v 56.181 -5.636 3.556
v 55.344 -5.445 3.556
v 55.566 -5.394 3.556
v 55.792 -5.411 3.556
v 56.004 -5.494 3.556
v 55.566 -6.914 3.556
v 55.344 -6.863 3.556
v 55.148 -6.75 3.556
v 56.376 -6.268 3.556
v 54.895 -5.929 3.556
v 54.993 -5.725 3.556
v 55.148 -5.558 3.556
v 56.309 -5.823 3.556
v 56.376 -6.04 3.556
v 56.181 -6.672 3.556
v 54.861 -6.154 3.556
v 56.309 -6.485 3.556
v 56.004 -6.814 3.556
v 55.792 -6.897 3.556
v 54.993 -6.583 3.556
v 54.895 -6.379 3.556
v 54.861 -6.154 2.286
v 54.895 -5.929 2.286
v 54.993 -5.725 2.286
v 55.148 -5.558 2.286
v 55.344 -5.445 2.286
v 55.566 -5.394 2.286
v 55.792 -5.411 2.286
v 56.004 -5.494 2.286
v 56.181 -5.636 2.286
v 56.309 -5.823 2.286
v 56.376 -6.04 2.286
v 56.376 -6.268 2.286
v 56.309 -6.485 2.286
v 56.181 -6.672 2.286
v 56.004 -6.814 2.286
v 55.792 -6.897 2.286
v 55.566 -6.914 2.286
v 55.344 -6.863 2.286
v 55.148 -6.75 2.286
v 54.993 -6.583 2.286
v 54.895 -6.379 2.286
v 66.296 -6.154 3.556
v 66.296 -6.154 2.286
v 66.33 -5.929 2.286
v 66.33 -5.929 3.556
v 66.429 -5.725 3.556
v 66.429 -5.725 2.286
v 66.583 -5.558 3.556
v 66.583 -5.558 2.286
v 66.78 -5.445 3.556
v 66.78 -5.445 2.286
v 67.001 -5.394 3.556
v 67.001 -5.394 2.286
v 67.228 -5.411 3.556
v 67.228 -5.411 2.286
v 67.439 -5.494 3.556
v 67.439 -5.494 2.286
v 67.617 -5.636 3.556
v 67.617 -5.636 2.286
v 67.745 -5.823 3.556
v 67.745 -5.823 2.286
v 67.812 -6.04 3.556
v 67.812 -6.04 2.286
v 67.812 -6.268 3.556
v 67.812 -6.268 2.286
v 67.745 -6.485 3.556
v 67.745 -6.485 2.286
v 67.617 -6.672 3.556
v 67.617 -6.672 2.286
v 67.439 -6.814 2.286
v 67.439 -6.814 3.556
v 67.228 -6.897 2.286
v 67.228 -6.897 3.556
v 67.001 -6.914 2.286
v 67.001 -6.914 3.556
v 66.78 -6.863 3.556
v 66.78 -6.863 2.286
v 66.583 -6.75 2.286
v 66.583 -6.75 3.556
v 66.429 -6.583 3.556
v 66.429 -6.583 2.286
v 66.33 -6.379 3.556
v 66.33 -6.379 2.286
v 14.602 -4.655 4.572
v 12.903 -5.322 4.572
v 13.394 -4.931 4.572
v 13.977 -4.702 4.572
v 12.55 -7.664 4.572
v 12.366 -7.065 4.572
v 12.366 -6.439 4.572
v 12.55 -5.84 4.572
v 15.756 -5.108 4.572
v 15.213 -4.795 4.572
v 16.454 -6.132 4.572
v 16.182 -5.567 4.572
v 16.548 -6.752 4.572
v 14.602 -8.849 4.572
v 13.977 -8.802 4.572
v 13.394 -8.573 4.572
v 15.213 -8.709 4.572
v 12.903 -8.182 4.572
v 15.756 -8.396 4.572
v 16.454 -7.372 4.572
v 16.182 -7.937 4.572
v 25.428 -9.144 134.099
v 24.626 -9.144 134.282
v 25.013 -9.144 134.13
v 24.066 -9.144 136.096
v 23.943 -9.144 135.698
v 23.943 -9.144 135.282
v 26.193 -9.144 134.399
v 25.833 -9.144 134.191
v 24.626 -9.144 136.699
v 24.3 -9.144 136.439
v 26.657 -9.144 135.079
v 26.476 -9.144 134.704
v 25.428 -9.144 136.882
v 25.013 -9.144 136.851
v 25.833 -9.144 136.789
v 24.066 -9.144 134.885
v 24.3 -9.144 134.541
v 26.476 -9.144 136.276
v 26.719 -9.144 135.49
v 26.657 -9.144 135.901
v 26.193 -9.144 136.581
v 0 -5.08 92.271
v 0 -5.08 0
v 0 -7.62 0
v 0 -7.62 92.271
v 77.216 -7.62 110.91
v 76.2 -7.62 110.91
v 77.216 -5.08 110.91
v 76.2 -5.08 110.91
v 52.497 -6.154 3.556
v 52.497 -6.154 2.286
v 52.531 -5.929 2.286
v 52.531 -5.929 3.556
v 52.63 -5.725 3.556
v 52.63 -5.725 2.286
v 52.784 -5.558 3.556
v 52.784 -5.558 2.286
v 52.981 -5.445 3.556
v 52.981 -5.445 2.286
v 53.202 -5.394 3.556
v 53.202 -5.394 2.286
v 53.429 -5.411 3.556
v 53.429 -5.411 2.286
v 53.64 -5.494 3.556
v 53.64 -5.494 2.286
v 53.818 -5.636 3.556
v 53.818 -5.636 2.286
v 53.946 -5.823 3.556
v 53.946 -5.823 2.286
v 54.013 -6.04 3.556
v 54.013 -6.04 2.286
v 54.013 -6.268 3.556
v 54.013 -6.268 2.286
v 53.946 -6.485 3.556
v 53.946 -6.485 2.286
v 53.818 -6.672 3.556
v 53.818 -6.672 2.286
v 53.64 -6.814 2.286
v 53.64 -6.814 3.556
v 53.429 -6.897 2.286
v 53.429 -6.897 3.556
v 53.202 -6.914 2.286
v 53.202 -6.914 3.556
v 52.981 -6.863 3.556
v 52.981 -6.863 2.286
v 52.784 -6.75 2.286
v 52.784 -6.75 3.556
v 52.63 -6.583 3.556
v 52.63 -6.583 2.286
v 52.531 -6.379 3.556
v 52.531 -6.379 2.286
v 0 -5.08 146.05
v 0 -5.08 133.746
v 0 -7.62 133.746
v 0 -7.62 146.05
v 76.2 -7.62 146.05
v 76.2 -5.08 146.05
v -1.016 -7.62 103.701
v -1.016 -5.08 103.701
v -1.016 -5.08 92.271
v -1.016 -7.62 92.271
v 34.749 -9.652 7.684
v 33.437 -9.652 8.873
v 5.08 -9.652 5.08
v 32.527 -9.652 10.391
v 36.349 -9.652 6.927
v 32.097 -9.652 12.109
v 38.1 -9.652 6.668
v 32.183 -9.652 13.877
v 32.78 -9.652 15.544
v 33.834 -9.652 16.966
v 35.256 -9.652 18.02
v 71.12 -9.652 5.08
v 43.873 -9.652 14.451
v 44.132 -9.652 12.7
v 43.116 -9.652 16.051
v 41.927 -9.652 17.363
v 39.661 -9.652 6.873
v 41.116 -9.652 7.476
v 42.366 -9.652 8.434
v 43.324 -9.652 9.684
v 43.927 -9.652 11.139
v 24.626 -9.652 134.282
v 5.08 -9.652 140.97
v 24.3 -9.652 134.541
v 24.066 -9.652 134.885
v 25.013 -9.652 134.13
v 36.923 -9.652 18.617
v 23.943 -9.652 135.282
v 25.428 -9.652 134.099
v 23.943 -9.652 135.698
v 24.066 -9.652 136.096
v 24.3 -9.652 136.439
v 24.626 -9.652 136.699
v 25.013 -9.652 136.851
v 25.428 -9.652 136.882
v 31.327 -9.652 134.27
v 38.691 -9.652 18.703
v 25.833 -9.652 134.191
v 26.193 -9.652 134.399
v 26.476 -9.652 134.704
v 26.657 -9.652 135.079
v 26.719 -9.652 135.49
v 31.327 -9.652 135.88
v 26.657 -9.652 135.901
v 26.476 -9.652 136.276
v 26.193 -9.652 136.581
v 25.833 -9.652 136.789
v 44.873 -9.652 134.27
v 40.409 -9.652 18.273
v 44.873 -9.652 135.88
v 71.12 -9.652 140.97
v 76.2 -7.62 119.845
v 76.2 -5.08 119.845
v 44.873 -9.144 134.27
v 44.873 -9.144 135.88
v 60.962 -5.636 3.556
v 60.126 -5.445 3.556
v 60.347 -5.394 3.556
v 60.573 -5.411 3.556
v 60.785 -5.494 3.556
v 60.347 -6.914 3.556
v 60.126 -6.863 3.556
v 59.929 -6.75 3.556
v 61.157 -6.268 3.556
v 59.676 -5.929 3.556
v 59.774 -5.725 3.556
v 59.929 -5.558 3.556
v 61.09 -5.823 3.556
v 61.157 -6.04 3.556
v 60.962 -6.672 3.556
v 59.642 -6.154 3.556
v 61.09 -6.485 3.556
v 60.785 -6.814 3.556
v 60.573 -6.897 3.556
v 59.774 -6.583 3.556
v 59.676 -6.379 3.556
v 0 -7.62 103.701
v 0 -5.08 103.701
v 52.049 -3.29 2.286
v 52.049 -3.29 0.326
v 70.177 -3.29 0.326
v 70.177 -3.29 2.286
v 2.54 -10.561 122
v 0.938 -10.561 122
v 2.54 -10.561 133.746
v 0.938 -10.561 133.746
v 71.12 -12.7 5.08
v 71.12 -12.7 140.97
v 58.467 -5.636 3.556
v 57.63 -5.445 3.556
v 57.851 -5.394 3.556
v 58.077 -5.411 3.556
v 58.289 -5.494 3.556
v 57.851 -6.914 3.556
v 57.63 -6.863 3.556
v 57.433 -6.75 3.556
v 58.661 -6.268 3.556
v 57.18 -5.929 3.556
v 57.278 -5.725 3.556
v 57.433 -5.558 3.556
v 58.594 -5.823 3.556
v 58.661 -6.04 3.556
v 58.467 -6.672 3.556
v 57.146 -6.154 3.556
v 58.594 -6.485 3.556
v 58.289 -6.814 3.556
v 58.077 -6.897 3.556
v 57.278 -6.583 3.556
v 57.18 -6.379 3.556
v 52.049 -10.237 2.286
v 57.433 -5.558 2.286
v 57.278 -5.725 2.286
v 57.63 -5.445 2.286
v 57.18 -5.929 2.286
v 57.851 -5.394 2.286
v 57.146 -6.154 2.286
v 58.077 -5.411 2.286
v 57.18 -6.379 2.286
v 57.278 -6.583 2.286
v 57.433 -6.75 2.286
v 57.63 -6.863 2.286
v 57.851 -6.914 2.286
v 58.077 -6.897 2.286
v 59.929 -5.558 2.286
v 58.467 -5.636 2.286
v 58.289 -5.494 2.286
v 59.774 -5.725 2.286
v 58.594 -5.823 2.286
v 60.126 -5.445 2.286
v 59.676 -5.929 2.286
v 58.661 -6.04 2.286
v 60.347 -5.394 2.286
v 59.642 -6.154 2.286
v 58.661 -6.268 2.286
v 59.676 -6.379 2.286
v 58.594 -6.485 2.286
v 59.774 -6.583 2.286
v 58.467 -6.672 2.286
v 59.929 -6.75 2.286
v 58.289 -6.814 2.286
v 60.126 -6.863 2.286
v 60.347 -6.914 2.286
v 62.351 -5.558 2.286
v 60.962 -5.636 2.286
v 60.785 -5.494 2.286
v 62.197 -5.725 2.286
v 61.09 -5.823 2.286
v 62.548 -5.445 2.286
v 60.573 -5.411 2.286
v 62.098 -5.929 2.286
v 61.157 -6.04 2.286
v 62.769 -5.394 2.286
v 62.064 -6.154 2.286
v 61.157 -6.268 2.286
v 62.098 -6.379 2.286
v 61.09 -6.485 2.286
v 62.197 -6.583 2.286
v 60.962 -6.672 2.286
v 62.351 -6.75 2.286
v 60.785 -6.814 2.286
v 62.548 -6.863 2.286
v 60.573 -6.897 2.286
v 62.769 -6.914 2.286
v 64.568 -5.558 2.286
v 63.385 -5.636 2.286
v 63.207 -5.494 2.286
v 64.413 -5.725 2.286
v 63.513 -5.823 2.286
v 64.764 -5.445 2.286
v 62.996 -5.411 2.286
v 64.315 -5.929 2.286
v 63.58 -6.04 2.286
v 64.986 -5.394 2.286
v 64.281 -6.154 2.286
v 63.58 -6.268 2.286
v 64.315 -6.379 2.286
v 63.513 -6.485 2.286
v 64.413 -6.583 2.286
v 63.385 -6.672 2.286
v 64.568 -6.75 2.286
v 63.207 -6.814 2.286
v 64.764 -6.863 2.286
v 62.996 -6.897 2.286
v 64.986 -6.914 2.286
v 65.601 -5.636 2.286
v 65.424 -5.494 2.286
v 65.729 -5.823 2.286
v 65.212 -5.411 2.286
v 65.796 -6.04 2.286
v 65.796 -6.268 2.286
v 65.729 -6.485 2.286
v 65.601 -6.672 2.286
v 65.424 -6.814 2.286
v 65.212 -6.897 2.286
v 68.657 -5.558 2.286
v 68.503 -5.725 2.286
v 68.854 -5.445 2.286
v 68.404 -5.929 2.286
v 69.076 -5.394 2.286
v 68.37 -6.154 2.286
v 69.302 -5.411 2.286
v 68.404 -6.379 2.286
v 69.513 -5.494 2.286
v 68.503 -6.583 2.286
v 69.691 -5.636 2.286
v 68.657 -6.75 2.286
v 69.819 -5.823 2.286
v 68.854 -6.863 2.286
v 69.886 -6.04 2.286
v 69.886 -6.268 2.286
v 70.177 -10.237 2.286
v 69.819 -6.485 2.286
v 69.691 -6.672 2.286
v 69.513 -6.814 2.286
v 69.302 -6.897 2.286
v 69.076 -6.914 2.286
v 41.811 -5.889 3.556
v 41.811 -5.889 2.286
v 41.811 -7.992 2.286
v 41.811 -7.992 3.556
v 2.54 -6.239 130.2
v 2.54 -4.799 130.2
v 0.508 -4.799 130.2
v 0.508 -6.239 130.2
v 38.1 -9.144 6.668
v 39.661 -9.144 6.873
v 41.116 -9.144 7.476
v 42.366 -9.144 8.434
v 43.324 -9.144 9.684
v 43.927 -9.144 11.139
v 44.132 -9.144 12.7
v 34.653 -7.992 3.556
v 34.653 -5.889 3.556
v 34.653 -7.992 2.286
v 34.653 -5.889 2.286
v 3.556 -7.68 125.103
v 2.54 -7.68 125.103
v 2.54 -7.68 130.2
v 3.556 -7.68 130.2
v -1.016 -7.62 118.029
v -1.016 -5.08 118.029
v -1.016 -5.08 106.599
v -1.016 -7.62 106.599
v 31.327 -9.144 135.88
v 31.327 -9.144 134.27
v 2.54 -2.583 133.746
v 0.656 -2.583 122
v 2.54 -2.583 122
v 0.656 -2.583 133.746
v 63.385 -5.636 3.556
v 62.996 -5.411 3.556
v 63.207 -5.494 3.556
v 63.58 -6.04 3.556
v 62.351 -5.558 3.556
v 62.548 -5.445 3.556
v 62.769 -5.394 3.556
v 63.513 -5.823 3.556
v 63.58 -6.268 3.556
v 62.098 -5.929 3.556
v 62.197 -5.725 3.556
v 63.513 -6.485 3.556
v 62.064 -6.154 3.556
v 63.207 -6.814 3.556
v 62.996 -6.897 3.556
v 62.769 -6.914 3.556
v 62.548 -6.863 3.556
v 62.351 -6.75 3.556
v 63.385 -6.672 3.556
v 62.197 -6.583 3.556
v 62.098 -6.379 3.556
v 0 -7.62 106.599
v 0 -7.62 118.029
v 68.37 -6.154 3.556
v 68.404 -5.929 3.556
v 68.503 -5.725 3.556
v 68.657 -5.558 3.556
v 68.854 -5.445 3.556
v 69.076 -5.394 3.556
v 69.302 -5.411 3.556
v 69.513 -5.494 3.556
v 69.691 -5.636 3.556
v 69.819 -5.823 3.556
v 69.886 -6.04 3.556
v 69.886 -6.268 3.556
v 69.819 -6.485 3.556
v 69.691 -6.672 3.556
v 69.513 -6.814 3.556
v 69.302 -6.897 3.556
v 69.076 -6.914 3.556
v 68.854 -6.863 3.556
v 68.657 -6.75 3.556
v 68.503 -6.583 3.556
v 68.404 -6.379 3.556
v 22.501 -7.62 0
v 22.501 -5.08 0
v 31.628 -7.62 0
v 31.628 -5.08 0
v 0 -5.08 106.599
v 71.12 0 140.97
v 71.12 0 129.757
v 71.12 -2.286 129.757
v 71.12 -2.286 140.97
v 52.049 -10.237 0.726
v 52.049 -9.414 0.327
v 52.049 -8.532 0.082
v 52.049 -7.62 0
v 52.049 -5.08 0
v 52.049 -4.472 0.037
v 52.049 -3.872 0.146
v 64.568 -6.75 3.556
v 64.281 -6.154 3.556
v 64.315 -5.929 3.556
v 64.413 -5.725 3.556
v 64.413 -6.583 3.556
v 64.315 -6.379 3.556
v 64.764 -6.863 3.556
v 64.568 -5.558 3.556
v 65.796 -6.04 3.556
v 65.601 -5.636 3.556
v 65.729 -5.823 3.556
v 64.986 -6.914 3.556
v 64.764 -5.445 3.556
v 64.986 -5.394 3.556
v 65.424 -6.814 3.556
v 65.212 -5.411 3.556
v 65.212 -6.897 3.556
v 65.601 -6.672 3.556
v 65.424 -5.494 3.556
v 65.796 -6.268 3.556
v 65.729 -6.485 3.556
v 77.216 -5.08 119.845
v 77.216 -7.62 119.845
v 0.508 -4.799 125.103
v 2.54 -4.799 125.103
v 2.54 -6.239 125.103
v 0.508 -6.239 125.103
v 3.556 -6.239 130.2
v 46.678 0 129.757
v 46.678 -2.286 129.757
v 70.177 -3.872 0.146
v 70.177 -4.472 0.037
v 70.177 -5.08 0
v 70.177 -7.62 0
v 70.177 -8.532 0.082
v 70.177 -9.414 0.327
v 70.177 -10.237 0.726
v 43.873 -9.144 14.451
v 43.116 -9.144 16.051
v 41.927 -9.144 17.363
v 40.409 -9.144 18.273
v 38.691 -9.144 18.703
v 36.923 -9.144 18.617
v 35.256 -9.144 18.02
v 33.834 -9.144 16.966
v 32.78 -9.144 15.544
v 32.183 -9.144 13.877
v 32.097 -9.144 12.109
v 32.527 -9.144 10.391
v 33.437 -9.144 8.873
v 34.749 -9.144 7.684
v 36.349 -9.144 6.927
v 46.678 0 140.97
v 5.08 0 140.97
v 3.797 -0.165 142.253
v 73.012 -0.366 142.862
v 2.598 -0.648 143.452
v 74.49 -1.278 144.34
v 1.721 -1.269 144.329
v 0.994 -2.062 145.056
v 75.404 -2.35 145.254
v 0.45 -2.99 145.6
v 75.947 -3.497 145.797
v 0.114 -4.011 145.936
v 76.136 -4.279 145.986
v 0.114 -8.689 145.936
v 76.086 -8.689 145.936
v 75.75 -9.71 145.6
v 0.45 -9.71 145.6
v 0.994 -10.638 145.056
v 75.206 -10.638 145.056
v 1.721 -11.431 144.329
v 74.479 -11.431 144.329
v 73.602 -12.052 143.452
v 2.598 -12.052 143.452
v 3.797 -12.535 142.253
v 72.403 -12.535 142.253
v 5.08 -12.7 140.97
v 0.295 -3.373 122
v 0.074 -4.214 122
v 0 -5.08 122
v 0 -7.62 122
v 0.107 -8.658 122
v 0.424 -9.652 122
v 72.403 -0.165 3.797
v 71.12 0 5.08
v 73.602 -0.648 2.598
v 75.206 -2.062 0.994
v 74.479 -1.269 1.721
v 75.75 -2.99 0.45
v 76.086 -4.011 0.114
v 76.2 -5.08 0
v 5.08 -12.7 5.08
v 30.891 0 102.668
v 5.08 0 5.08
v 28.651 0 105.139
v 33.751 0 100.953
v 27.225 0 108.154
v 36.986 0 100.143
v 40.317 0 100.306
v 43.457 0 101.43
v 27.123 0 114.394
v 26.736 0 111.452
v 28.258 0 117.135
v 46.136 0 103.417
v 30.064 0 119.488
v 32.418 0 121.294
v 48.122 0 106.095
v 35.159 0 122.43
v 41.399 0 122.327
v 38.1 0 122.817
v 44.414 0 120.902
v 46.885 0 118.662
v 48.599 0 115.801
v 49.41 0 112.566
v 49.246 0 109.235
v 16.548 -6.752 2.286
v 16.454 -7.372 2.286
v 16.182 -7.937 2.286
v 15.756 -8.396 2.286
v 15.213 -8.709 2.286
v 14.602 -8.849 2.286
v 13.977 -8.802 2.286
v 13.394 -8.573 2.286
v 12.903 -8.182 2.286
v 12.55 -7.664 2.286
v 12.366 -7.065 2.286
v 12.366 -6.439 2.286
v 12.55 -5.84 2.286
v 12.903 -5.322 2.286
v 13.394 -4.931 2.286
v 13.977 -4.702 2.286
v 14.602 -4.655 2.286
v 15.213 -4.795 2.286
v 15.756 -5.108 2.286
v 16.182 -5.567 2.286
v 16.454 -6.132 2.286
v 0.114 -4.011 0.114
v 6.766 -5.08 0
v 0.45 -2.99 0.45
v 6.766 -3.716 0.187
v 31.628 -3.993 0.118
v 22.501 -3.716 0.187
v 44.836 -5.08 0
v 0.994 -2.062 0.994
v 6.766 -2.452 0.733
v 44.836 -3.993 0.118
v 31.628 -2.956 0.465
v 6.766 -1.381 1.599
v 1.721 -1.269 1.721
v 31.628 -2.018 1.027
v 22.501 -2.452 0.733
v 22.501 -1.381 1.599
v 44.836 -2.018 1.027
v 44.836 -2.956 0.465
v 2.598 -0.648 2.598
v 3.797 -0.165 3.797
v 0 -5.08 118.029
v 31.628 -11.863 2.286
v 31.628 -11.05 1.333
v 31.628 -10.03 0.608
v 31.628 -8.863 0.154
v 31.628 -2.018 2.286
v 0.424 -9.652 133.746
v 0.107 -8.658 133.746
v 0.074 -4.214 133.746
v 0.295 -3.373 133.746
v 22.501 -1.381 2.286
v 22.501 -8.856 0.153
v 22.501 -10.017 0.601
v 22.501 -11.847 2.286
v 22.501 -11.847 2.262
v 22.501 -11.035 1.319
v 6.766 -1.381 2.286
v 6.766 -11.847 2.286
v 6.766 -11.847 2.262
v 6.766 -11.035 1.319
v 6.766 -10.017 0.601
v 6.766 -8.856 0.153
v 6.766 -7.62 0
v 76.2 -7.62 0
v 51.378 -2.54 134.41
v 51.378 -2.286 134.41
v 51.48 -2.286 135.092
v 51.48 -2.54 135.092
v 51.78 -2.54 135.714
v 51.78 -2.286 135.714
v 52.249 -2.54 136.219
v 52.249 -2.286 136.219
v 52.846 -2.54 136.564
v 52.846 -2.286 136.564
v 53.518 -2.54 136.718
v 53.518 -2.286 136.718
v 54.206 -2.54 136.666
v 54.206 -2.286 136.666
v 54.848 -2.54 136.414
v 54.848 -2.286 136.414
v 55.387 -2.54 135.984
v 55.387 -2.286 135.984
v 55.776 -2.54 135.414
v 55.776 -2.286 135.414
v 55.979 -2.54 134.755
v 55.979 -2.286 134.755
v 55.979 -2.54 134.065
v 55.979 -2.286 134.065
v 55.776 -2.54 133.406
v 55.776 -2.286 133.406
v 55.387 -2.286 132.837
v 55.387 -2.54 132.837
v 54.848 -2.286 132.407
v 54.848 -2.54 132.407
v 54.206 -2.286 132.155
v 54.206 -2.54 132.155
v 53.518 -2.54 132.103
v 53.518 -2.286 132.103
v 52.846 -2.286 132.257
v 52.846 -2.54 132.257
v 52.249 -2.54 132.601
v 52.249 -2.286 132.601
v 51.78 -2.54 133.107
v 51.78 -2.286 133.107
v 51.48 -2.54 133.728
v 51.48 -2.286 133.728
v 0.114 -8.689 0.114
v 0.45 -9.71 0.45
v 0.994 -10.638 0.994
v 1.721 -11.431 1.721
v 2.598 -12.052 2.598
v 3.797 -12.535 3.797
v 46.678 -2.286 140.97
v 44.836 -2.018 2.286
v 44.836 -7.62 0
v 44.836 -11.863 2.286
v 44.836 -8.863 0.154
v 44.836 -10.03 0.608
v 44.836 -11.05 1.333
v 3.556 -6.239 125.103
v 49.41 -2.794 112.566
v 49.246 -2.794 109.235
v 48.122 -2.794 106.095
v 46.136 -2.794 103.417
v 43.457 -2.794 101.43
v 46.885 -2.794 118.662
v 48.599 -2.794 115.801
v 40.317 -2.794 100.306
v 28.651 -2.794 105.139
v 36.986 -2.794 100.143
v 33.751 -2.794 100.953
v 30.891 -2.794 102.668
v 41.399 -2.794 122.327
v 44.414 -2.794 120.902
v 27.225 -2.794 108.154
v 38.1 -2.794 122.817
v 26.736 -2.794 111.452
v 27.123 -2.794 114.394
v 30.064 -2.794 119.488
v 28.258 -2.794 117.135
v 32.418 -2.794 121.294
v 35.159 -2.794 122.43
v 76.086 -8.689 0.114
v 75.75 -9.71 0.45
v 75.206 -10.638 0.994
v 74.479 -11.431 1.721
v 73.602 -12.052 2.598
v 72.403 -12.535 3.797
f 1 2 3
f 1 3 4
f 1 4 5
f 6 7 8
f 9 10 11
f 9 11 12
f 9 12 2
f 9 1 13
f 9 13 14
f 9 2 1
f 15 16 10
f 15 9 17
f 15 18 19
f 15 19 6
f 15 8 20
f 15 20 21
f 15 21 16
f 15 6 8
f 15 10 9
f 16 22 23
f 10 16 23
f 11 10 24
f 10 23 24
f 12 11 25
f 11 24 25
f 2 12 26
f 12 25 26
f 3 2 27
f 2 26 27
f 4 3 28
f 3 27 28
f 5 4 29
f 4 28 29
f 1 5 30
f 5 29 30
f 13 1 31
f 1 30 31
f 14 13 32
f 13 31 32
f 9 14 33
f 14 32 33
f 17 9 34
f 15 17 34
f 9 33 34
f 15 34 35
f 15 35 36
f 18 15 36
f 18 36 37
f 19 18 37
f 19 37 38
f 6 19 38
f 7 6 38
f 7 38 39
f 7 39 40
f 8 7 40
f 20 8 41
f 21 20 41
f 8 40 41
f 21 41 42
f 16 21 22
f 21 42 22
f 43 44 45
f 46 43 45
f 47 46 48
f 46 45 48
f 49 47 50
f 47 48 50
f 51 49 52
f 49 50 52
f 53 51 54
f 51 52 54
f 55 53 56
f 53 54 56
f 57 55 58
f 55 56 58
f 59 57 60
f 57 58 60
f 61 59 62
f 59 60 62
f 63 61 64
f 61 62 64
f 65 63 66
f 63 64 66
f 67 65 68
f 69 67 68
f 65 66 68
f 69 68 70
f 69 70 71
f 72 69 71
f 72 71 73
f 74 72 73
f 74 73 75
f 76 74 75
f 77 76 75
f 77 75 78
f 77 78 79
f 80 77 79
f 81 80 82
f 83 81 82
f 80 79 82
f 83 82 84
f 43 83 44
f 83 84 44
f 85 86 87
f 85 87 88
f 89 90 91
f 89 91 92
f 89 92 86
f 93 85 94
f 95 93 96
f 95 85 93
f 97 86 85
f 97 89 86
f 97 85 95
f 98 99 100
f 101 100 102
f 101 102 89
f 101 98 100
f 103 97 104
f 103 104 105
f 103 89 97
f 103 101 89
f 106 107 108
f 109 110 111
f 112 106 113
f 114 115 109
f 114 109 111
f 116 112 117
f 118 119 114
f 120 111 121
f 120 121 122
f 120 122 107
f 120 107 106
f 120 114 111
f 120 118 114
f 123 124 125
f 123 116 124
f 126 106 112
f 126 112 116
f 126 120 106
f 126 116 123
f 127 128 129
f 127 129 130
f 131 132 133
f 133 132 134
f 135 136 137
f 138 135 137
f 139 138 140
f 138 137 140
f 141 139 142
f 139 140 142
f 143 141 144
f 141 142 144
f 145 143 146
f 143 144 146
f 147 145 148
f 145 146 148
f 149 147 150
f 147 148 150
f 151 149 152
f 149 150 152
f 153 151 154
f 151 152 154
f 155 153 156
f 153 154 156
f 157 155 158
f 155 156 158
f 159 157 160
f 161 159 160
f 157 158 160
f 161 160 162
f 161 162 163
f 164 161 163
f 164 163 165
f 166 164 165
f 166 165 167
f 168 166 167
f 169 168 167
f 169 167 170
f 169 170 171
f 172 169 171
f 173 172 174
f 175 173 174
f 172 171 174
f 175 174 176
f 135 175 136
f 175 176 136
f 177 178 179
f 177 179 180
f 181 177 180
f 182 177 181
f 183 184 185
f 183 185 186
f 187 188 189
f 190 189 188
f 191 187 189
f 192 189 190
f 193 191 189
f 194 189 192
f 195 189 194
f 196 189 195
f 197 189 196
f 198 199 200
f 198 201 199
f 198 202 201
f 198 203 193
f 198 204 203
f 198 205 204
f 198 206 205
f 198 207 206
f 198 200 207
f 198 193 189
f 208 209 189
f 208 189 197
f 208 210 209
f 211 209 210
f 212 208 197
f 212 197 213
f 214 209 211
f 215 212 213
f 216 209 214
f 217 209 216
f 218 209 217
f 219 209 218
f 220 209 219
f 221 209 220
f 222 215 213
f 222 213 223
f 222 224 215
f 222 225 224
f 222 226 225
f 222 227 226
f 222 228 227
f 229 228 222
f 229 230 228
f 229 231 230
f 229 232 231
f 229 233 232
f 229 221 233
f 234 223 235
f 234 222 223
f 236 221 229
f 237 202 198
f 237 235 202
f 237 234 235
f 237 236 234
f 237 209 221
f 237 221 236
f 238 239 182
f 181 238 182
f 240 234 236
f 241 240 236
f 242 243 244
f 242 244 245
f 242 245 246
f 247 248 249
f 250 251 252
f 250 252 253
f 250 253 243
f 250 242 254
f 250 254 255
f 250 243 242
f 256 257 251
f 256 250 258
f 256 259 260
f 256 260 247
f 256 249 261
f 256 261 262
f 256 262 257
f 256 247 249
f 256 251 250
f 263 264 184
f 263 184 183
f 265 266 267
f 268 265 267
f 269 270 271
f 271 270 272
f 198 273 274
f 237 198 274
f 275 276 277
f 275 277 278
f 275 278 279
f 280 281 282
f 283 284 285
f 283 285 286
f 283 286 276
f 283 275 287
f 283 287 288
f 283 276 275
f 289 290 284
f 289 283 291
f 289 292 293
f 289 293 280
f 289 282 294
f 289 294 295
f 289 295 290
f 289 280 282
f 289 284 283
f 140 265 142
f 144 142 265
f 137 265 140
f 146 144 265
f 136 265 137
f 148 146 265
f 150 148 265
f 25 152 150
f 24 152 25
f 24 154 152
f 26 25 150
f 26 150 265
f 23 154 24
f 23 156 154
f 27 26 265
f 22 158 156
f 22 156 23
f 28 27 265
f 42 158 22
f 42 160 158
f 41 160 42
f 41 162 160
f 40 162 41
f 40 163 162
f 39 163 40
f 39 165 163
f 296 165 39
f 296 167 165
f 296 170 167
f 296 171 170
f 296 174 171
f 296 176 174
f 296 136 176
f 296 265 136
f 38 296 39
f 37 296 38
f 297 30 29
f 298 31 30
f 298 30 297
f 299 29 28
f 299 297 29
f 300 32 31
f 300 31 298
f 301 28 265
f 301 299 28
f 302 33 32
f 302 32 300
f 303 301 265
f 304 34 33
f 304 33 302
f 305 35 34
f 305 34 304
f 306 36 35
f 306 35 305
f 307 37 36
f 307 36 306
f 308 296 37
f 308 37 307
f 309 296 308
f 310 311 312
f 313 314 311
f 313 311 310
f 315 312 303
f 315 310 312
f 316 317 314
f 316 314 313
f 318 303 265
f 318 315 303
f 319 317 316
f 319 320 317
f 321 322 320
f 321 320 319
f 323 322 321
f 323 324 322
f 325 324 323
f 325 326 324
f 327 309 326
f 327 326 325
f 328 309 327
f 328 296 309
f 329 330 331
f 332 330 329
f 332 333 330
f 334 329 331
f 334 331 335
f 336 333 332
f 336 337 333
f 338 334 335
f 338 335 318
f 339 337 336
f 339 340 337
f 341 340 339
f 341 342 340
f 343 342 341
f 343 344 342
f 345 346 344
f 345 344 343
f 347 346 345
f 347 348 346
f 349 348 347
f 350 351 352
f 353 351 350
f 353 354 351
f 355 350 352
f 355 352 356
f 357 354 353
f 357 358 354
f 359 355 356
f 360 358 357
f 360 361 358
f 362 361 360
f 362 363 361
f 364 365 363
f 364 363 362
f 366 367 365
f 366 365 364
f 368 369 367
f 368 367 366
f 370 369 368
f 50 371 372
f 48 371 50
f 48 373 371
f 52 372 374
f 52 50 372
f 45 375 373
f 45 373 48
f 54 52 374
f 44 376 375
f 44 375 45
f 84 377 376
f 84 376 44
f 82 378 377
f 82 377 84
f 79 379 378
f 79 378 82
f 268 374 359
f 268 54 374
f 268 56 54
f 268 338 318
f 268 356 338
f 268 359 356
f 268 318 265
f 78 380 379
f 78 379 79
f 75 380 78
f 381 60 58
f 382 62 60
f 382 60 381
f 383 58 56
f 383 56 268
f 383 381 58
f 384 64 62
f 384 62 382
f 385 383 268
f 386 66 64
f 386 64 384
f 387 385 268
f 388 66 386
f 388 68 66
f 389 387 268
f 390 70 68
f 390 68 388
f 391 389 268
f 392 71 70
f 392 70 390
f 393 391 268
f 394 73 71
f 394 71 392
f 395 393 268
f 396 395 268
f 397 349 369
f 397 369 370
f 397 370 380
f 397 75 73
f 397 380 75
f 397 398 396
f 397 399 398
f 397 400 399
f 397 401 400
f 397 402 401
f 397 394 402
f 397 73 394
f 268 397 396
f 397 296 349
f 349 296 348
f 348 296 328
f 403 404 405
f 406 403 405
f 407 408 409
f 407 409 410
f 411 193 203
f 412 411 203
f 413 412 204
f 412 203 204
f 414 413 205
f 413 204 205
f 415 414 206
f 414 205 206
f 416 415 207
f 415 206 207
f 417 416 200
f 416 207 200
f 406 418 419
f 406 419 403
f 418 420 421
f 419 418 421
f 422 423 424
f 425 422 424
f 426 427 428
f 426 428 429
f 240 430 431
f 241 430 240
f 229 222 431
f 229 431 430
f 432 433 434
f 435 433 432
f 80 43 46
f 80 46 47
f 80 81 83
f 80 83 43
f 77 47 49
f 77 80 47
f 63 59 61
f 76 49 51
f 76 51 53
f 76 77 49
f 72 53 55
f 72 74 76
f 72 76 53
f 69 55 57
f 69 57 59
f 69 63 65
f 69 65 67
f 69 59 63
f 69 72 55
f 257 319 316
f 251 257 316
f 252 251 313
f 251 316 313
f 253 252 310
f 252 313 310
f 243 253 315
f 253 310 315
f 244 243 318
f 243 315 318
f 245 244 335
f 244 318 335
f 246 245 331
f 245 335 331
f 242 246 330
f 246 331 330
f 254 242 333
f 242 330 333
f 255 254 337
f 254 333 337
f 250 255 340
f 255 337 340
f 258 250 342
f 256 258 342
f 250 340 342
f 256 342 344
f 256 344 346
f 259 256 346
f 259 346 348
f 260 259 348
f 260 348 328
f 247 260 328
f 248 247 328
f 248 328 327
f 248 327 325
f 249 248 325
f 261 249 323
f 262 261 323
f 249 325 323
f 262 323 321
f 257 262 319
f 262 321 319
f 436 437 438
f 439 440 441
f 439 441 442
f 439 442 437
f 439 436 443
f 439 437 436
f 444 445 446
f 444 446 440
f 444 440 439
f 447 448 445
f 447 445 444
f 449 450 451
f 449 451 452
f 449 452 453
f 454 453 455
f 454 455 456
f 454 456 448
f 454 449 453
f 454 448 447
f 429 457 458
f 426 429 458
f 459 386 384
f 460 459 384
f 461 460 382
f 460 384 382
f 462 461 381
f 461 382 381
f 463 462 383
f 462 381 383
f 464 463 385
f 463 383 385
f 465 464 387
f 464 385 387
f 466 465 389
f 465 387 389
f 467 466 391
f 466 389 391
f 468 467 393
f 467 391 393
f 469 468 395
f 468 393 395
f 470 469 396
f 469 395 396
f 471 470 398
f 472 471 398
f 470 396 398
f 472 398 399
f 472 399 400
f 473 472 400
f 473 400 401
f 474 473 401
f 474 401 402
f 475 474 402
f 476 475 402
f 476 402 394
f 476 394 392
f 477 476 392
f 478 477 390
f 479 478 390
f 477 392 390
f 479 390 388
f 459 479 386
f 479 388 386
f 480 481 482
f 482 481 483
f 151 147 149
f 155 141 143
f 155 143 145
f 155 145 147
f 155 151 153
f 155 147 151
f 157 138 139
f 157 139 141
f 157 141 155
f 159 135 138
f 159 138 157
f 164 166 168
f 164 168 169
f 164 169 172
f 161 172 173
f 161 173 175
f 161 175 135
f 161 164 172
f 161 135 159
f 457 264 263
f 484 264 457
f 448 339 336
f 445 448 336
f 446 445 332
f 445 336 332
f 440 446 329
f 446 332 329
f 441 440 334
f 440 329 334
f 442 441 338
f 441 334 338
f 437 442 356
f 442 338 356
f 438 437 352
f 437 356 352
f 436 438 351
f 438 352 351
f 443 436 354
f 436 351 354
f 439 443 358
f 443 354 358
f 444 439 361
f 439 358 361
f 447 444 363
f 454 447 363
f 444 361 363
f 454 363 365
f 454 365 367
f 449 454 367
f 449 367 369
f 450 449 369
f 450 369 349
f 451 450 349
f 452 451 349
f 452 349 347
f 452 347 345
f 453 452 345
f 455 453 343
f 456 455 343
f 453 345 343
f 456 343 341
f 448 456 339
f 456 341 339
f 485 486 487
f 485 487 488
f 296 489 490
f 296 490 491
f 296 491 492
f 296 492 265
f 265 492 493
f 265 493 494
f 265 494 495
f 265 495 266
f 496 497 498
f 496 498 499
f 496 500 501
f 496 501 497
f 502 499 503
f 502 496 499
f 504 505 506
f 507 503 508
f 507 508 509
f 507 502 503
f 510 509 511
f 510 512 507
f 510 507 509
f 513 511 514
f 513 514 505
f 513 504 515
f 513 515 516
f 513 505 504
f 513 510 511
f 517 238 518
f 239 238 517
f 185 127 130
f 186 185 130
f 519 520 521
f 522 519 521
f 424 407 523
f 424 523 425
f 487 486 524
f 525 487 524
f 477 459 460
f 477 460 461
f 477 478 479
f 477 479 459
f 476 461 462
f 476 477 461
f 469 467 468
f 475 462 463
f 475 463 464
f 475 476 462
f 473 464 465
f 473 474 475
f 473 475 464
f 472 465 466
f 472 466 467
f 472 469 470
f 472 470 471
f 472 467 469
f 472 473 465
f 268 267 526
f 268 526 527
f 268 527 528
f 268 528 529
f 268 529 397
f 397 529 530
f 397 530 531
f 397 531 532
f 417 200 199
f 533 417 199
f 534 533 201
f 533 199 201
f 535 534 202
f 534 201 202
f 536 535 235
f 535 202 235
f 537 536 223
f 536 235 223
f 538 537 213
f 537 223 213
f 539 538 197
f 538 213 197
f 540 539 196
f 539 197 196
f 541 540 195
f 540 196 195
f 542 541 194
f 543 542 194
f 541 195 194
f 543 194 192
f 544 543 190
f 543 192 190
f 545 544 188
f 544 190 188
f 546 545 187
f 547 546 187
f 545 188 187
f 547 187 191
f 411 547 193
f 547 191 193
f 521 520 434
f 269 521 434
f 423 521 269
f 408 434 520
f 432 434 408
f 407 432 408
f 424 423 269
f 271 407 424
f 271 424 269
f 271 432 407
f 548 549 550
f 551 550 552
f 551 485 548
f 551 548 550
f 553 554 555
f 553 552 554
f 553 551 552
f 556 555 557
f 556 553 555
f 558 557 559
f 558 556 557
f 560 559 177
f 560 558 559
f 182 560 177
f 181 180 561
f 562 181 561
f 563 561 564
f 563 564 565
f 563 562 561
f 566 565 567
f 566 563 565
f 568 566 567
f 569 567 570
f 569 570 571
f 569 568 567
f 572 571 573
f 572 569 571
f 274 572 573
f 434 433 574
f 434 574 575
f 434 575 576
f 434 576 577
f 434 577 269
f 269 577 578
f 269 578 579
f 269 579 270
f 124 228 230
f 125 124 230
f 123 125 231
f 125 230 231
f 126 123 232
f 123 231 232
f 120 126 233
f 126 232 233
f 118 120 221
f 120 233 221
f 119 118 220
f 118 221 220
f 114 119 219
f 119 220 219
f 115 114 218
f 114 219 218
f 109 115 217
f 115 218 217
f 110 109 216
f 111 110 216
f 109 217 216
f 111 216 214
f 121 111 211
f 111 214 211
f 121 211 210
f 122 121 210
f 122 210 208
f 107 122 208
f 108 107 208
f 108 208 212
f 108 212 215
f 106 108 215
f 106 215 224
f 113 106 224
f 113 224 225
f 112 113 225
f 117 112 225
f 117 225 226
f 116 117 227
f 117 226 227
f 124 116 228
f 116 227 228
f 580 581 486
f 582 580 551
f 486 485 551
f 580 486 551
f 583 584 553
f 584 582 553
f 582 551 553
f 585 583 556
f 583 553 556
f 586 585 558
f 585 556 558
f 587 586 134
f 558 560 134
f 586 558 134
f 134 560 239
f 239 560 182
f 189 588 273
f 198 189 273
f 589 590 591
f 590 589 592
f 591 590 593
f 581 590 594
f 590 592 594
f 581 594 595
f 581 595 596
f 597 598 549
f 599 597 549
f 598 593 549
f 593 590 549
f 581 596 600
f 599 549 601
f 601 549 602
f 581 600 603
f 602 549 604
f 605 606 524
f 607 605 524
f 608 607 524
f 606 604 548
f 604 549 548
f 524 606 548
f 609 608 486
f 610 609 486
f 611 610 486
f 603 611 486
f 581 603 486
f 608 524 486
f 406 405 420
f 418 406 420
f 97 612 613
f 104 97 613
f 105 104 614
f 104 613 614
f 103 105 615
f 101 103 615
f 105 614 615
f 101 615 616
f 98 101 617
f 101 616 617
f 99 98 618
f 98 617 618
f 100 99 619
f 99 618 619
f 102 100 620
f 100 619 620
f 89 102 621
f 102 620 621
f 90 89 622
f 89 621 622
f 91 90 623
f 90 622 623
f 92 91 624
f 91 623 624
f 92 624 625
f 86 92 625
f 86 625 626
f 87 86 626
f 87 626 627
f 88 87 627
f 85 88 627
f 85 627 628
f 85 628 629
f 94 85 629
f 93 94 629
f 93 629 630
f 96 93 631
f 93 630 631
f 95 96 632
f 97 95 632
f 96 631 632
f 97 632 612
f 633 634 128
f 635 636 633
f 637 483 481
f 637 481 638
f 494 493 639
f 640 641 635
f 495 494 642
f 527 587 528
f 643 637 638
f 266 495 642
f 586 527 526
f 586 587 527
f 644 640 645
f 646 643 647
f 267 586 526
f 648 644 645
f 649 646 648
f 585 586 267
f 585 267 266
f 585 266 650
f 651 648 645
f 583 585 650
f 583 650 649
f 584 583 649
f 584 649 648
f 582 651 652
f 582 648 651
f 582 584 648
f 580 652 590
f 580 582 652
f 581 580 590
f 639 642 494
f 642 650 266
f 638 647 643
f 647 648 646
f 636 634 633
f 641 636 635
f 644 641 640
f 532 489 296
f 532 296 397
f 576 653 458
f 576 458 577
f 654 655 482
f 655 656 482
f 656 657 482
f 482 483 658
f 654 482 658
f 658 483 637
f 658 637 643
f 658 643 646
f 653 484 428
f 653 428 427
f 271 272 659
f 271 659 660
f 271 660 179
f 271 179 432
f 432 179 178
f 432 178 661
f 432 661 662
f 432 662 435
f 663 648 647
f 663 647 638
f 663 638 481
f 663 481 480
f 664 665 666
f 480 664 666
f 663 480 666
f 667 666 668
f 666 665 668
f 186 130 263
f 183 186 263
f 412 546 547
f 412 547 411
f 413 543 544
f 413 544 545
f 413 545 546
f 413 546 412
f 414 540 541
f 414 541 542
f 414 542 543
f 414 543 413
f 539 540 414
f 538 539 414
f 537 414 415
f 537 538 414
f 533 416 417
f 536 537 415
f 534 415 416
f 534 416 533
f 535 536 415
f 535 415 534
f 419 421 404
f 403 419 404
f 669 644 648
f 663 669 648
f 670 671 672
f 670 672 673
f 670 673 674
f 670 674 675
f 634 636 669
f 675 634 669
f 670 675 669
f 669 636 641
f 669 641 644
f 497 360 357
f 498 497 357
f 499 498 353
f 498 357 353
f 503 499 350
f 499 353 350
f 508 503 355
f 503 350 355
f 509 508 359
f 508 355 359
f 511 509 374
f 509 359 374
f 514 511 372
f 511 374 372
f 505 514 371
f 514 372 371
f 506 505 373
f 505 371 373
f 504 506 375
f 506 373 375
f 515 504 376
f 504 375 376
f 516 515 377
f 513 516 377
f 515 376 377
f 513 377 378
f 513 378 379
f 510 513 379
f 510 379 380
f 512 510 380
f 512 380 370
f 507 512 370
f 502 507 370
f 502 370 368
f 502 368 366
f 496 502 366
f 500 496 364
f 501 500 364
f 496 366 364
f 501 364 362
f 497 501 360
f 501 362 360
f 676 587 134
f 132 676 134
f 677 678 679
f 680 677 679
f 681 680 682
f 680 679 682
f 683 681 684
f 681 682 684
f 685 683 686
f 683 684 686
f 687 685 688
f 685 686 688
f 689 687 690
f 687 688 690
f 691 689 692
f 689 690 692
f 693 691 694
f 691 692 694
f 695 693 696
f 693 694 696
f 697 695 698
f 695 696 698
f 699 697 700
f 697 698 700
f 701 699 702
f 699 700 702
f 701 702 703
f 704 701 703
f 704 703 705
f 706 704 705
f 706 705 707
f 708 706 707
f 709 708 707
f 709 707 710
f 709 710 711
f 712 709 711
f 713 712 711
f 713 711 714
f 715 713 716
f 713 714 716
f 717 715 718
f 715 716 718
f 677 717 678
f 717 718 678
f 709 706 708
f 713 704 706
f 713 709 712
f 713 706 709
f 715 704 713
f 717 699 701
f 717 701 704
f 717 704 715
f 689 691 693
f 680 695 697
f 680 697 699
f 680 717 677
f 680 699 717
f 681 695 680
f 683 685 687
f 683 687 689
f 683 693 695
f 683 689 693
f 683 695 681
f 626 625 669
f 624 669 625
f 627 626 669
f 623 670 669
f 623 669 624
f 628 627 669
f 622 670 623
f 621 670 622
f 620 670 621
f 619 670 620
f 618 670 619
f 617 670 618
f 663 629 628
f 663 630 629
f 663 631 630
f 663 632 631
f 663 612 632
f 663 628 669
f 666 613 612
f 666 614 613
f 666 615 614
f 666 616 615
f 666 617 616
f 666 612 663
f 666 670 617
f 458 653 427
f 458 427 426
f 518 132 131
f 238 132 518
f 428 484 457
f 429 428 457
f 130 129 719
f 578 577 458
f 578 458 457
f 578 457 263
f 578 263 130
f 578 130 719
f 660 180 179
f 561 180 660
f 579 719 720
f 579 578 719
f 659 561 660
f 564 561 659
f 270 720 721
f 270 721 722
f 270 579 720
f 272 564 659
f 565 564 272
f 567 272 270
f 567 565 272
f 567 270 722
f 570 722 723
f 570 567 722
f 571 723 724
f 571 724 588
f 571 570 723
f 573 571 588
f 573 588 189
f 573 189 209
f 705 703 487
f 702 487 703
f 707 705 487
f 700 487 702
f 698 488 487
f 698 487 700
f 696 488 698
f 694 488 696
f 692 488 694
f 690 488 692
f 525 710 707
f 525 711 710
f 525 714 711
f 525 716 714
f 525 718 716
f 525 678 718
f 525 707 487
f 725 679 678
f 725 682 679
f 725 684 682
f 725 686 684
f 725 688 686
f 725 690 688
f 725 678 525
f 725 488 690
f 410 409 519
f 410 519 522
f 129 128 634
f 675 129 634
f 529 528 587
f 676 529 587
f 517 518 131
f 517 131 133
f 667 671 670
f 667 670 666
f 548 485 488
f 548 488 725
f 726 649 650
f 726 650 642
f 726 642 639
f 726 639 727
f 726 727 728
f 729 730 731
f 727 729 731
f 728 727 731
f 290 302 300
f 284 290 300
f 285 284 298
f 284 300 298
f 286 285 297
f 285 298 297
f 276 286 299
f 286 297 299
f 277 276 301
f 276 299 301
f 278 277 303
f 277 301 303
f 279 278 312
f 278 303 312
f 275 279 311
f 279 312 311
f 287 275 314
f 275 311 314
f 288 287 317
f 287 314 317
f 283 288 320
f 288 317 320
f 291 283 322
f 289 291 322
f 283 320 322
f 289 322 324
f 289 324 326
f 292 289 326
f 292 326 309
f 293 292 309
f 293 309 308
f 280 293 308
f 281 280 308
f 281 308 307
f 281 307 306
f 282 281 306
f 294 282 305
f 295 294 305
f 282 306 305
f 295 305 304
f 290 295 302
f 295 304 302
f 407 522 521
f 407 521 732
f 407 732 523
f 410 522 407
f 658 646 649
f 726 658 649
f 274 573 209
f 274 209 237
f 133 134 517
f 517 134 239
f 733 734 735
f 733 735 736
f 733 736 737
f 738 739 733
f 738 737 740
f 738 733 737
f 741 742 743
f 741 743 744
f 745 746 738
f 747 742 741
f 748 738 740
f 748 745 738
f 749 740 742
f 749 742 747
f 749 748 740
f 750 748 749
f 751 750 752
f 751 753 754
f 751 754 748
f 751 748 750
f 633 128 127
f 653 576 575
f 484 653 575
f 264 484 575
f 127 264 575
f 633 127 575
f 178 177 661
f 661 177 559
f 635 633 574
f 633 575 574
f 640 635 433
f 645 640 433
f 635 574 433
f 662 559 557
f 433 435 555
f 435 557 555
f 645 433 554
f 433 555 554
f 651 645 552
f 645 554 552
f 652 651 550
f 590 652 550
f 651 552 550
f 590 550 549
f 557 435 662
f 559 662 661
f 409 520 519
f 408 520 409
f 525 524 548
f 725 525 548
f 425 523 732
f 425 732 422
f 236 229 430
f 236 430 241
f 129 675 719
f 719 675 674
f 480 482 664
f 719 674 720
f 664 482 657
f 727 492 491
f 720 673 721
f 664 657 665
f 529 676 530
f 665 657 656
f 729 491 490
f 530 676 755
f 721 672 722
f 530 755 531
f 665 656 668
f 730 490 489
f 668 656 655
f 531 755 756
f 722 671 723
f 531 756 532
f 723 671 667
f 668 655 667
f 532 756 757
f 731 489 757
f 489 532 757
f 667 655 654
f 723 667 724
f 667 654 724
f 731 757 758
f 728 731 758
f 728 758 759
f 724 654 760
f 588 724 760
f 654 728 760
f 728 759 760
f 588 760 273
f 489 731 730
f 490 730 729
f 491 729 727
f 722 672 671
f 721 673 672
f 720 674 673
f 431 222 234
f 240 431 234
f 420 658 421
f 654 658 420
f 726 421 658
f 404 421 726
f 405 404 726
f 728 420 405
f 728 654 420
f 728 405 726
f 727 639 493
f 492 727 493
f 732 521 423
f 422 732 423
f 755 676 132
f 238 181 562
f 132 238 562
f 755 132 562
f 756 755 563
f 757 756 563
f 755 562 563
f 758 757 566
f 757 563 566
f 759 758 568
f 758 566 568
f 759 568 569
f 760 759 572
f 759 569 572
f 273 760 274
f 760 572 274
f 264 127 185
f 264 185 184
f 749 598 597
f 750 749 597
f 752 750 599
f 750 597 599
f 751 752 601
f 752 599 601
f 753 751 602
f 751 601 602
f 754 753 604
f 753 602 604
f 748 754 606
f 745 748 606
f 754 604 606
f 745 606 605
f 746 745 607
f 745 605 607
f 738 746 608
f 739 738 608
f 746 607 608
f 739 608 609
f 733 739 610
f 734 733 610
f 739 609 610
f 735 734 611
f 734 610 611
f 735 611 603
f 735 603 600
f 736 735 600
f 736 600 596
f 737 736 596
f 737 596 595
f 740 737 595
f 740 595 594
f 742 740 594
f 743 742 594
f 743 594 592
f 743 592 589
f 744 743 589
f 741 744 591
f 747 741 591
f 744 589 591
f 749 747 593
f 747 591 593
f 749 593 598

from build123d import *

# Parameters (mm, degrees)
F0_W      = 76.2
F0_H      = 146.05
F1_DEPTH  = 12.7
F2_R      = 5.08
F3_R      = 5.08
F4_DEPTH  = 2.54
F5_W      = 2.4973305091
F5_H      = 11.7452070117
F5_W_2    = 2.54
F5_W_3    = 2.9405460703
F6_DEPTH  = 2.54
F7_W      = 2.8808997013
F7_H      = 5.0969719887
F8_DEPTH  = 2.032
F9_W      = 1.4404498506
F9_H      = 5.0969719887
F10_DEPTH = 3.048
F11_W     = 2.54
F11_H     = 11.43
F12_DEPTH = 1.016
F13_W     = 2.54
F13_H     = 11.43
F14_DEPTH = 1.016
F16_DEPTH = 0.508
F17_W     = 15.7348513603
F17_H     = 10.4662538506
F17_H_2   = 4.2268524888
F18_DEPTH = 2.286
F19_W     = 18.1282758713
F19_H     = 1.7902922965
F19_H_2   = 2.54
F19_H_3   = 2.6172961119
F20_DEPTH = 2.286
F21_R     = 2.1027824112
F22_DEPTH = 2.286
F24_DEPTH = 1.27
F25_W     = 13.5468328476
F25_H     = 1.6100406647
F4_FACE_W = 66.04
F4_FACE_H = 135.89
F4_FACE_R = 6.0325
F26_DEPTH = 0.508
F27_R     = 1.3953400064
F28_DEPTH = 0.508
F30_DEPTH = 0.508
F31_W     = 6.604
F31_H     = 3.0624943002
F31_H_2   = 5.8275056998
F31_H_3   = 2.54
F32_DEPTH = 2.286
F34_DEPTH = 1.27
F35_W     = 24.4420864832
F35_H     = 11.2134301376
F36_DEPTH = 2.286
F39_R     = 2.3136513578
F40_DEPTH = 0.254
F42_DEPTH = 1.016
F43_DEPTH = 1.778
F44_W     = 2.54
F44_H     = 8.934661746
F45_DEPTH = 1.016


# Not quite as in the source:
# - the program builds the solid bodies; features that only make, move or delete a surface that nothing else refers to are left out


with BuildPart() as f1:
    # F0 (on Front) → F1 (new body)
    with BuildSketch(Plane.XZ):
        with Locations((38.1, 73.025)):
            Rectangle(F0_W, F0_H)
    extrude(amount=F1_DEPTH)

    # F2
    f2_edges = [f1.edges().sort_by_distance(p)[0] for p in [
        (0, -12.7, 73.025),
        (38.1, -12.7, 0),
        (76.2, -12.7, 73.025),
        (38.1, -12.7, 146.05),
    ]]
    fillet(f2_edges, radius=F2_R)

    # F3
    f3_edges = [f1.edges().sort_by_distance(p)[0] for p in [
        (0, 0, 73.025),
        (38.1, 0, 0),
        (76.2, 0, 73.025),
        (38.1, 0, 146.05),
    ]]
    fillet(f3_edges, radius=F3_R)

    # F4 (cut): a face of the model
    f4_faces = [f1.faces().sort_by_distance(p)[0] for p in [
        (38.1, -12.7, 73.025),
    ]]
    extrude(f4_faces, amount=-F4_DEPTH, mode=Mode.SUBTRACT)

    # F5 (on face) → F6 (cut)
    with BuildSketch(Plane(origin=(0, 0, 0), x_dir=(0, -1, 0), z_dir=(-1, 0, 0))):
        with Locations((3.8313347455, 127.8729029)):
            Rectangle(F5_W, F5_H)
        with Locations((6.35, 127.8729029)):
            Rectangle(F5_W_2, F5_H)
        with Locations((9.0902730352, 127.8729029)):
            Rectangle(F5_W_3, F5_H)
    extrude(amount=-F6_DEPTH, mode=Mode.SUBTRACT)

    # F7 (on face) → F8 (join)
    with BuildSketch(Plane(origin=(2.54, 0, 0), x_dir=(0, -1, 0), z_dir=(-1, 0, 0))):
        with Locations((6.2391965184, 127.6512891054)):
            Rectangle(F7_W, F7_H)
    extrude(amount=F8_DEPTH)

    # F9 (on face) → F10 (cut)
    with BuildSketch(Plane(origin=(0.508, 0, 0), x_dir=(0, -1, 0), z_dir=(-1, 0, 0))):
        with Locations((6.9594214438, 127.6512891054)):
            Rectangle(F9_W, F9_H)
    extrude(amount=-F10_DEPTH, mode=Mode.SUBTRACT)

    # F11 (on face) → F12 (join)
    with BuildSketch(Plane(origin=(0, 0, 0), x_dir=(0, -1, 0), z_dir=(-1, 0, 0))):
        with Locations((6.35, 112.3141669893)):
            Rectangle(F11_W, F11_H)
    extrude(amount=F12_DEPTH)

    # F13 (on face) → F14 (join)
    with BuildSketch(Plane(origin=(0, 0, 0), x_dir=(0, -1, 0), z_dir=(-1, 0, 0))):
        with Locations((6.35, 97.9860373998)):
            Rectangle(F13_W, F13_H)
    extrude(amount=F14_DEPTH)

    # F15 (on face) → F16 (cut)
    with BuildSketch(Plane.XZ.offset(10.16)):
        with BuildLine():
            ThreePointArc((44.1325, 12.7), (33.8343783425, 16.9656216575), (38.1, 6.6675))
            ThreePointArc((38.1, 6.6675), (42.3656216575, 8.4343783425), (44.1325, 12.7))
        make_face()
    extrude(amount=-F16_DEPTH, mode=Mode.SUBTRACT)

    # F17 (on face) → F18 (cut)
    with BuildSketch(Plane(origin=(0, 0, 0), x_dir=(1, 0, 0), z_dir=(0, 0, -1))):
        with Locations((14.6331973374, 6.6137255635)):
            Rectangle(F17_W, F17_H)
        with Locations((14.6331973374, 9.7334262444)):
            Rectangle(F17_W, F17_H_2)
    extrude(amount=-F18_DEPTH, mode=Mode.SUBTRACT)

    # F19 (on face) → F20 (cut)
    with BuildSketch(Plane(origin=(0, 0, 0), x_dir=(1, 0, 0), z_dir=(0, 0, -1))):
        with Locations((61.1127465963, 4.1848538518)):
            Rectangle(F19_W, F19_H)
        with Locations((61.1127465963, 6.35)):
            Rectangle(F19_W, F19_H_2)
        with Locations((61.1127465963, 8.9286480559)):
            Rectangle(F19_W, F19_H_3)
    extrude(amount=-F20_DEPTH, mode=Mode.SUBTRACT)

    # F21 (on face) → F22 (cut)
    with BuildSketch(Plane(origin=(0, 0, 2.286), x_dir=(1, 0, 0), z_dir=(0, 0, -1))):
        with Locations((14.4449183717, 6.7520015873)):
            Circle(F21_R)
    extrude(amount=-F22_DEPTH, mode=Mode.SUBTRACT)

    # F23 (on face) → F24 (cut)
    with BuildSketch(Plane(origin=(0, 0, 2.286), x_dir=(1, 0, 0), z_dir=(0, 0, -1))):
        with BuildLine():
            ThreePointArc((54.0211938972, 6.1539337039), (53.2591938972, 6.9159337039), (52.4971938972, 6.1539337039))
            Line((52.4971938972, 6.1539337039), (54.0211938972, 6.1539337039))
        make_face()
        with BuildLine():
            ThreePointArc((69.8944770451, 6.1539337039), (69.1324770451, 6.9159337039), (68.3704770451, 6.1539337039))
            Line((68.3704770451, 6.1539337039), (69.8944770451, 6.1539337039))
        make_face()
        with BuildLine():
            Line((69.8944770451, 6.1539337039), (68.3704770451, 6.1539337039))
            ThreePointArc((68.3704770451, 6.1539337039), (69.1324770451, 5.3919337039), (69.8944770451, 6.1539337039))
        make_face()
        with BuildLine():
            ThreePointArc((67.8202428575, 6.1539337039), (67.0582428575, 6.9159337039), (66.2962428575, 6.1539337039))
            Line((66.2962428575, 6.1539337039), (67.8202428575, 6.1539337039))
        make_face()
        with BuildLine():
            Line((67.8202428575, 6.1539337039), (66.2962428575, 6.1539337039))
            ThreePointArc((66.2962428575, 6.1539337039), (67.0582428575, 5.3919337039), (67.8202428575, 6.1539337039))
        make_face()
        with BuildLine():
            ThreePointArc((65.8047863002, 6.1539337039), (65.0427863002, 6.9159337039), (64.2807863002, 6.1539337039))
            Line((64.2807863002, 6.1539337039), (65.8047863002, 6.1539337039))
        make_face()
        with BuildLine():
            Line((65.8047863002, 6.1539337039), (64.2807863002, 6.1539337039))
            ThreePointArc((64.2807863002, 6.1539337039), (65.0427863002, 5.3919337039), (65.8047863002, 6.1539337039))
        make_face()
        with BuildLine():
            ThreePointArc((63.588320529, 6.1539337039), (62.826320529, 6.9159337039), (62.064320529, 6.1539337039))
            Line((62.064320529, 6.1539337039), (63.588320529, 6.1539337039))
        make_face()
        with BuildLine():
            Line((63.588320529, 6.1539337039), (62.064320529, 6.1539337039))
            ThreePointArc((62.064320529, 6.1539337039), (62.826320529, 5.3919337039), (63.588320529, 6.1539337039))
        make_face()
        with BuildLine():
            ThreePointArc((61.1659095342, 6.1539337039), (60.4039095342, 6.9159337039), (59.6419095342, 6.1539337039))
            Line((59.6419095342, 6.1539337039), (61.1659095342, 6.1539337039))
        make_face()
        with BuildLine():
            Line((61.1659095342, 6.1539337039), (59.6419095342, 6.1539337039))
            ThreePointArc((59.6419095342, 6.1539337039), (60.4039095342, 5.3919337039), (61.1659095342, 6.1539337039))
        make_face()
        with BuildLine():
            ThreePointArc((58.6699277813, 6.1539337039), (57.9079277813, 6.9159337039), (57.1459277813, 6.1539337039))
            Line((57.1459277813, 6.1539337039), (58.6699277813, 6.1539337039))
        make_face()
        with BuildLine():
            Line((58.6699277813, 6.1539337039), (57.1459277813, 6.1539337039))
            ThreePointArc((57.1459277813, 6.1539337039), (57.9079277813, 5.3919337039), (58.6699277813, 6.1539337039))
        make_face()
        with BuildLine():
            ThreePointArc((56.3848160858, 6.1539337039), (55.6228160858, 6.9159337039), (54.8608160858, 6.1539337039))
            Line((54.8608160858, 6.1539337039), (56.3848160858, 6.1539337039))
        make_face()
        with BuildLine():
            Line((56.3848160858, 6.1539337039), (54.8608160858, 6.1539337039))
            ThreePointArc((54.8608160858, 6.1539337039), (55.6228160858, 5.3919337039), (56.3848160858, 6.1539337039))
        make_face()
        with BuildLine():
            Line((54.0211938972, 6.1539337039), (52.4971938972, 6.1539337039))
            ThreePointArc((52.4971938972, 6.1539337039), (53.2591938972, 5.3919337039), (54.0211938972, 6.1539337039))
        make_face()
    extrude(amount=-F24_DEPTH, mode=Mode.SUBTRACT)

    # F25 (on face) + F4_face (on face) → F26 (cut)
    with BuildSketch(Plane.XZ.offset(9.652)):
        with Locations((38.1, 135.0751519203)):
            Rectangle(F25_W, F25_H)
    with BuildSketch(Plane(origin=(38.1, -10.16, 73.025), x_dir=(1, 0, 0), z_dir=(0, -1, 0))):
        Rectangle(F4_FACE_W, F4_FACE_H)
        with Locations((0, -60.325)):
            Circle(F4_FACE_R, mode=Mode.SUBTRACT)
    extrude(amount=-F26_DEPTH, mode=Mode.SUBTRACT)

    # F27 (on face) → F28 (cut)
    with BuildSketch(Plane.XZ.offset(9.652)):
        with Locations((25.323253125, 135.4901641607)):
            Circle(F27_R)
    extrude(amount=-F28_DEPTH, mode=Mode.SUBTRACT)

    # F29 (on face) → F30 (cut)
    with BuildSketch(Plane.XZ.offset(9.652)):
        with BuildLine():
            ThreePointArc((44.1325, 12.7), (33.8343783425, 16.9656216575), (38.1, 6.6675))
            ThreePointArc((38.1, 6.6675), (42.3656216575, 8.4343783425), (44.1325, 12.7))
        make_face()
    extrude(amount=-F30_DEPTH, mode=Mode.SUBTRACT)

    # F31 (on face) → F32 (cut)
    with BuildSketch(Plane(origin=(0, 0, 0), x_dir=(1, 0, 0), z_dir=(0, 0, -1))):
        with Locations((34.9296401281, 3.5487528499)):
            Rectangle(F31_W, F31_H)
        with Locations((41.5336401281, 10.5337528499)):
            Rectangle(F31_W, F31_H_2)
        with Locations((41.5336401281, 3.5487528499)):
            Rectangle(F31_W, F31_H)
        with Locations((34.9296401281, 6.35)):
            Rectangle(F31_W, F31_H_3)
        with Locations((41.5336401281, 6.35)):
            Rectangle(F31_W, F31_H_3)
        with Locations((34.9296401281, 10.5337528499)):
            Rectangle(F31_W, F31_H_2)
    extrude(amount=-F32_DEPTH, mode=Mode.SUBTRACT)

    # F33 (on face) → F34 (cut)
    with BuildSketch(Plane(origin=(0, 0, 2.286), x_dir=(1, 0, 0), z_dir=(0, 0, -1))):
        Polygon((34.6526485043, 7.9915548147), (34.6526485043, 6.9400710721), (34.6526485043, 5.8885873295), (41.810631752, 5.8885873295), (41.810631752, 7.9915548147), align=None)
    extrude(amount=-F34_DEPTH, mode=Mode.SUBTRACT)

    # F35 (on face) → F36 (cut)
    with BuildSketch(Plane(origin=(0, 0, 0), x_dir=(-1, 0, 0), z_dir=(0, 1, 0))):
        with Locations((-58.8989567584, 135.3632849312)):
            Rectangle(F35_W, F35_H)
    extrude(amount=-F36_DEPTH, mode=Mode.SUBTRACT)

    # F39 (on face) → F40 (cut)
    with BuildSketch(Plane(origin=(0, -2.286, 0), x_dir=(-1, 0, 0), z_dir=(0, 1, 0))):
        with Locations((-53.6911524832, 134.4103217125)):
            Circle(F39_R)
    extrude(amount=-F40_DEPTH, mode=Mode.SUBTRACT)

    # F41 (on face) → F42 (cut)
    with BuildSketch(Plane(origin=(0, 0, 0), x_dir=(-1, 0, 0), z_dir=(0, 1, 0))):
        with BuildLine():
            ThreePointArc((-38.1, 122.8167432735), (-46.1358037085, 103.4165969759), (-26.7356574109, 111.4524006844))
            ThreePointArc((-26.7356574109, 111.4524006844), (-30.0641962915, 119.4882043929), (-38.1, 122.8167432735))
        make_face()
        with BuildLine():
            ThreePointArc((-26.7356574109, 111.4524006844), (-30.0641962915, 119.4882043929), (-38.1, 122.8167432735))
            ThreePointArc((-38.1, 122.8167432735), (-46.1358037085, 103.4165969759), (-26.7356574109, 111.4524006844))
        make_face()
    extrude(amount=-F42_DEPTH, mode=Mode.SUBTRACT)

    # F43 (cut): a face of the model
    f43_faces = [f1.faces().sort_by_distance(p)[0] for p in [
        (38.1, -1.016, 111.4524006844),
    ]]
    extrude(f43_faces, amount=-F43_DEPTH, mode=Mode.SUBTRACT)

    # F44 (on face) → F45 (join)
    with BuildSketch(Plane.YZ.offset(76.2)):
        with Locations((-6.35, 115.3773292899)):
            Rectangle(F44_W, F44_H)
    extrude(amount=F45_DEPTH)


solid = f1.part
